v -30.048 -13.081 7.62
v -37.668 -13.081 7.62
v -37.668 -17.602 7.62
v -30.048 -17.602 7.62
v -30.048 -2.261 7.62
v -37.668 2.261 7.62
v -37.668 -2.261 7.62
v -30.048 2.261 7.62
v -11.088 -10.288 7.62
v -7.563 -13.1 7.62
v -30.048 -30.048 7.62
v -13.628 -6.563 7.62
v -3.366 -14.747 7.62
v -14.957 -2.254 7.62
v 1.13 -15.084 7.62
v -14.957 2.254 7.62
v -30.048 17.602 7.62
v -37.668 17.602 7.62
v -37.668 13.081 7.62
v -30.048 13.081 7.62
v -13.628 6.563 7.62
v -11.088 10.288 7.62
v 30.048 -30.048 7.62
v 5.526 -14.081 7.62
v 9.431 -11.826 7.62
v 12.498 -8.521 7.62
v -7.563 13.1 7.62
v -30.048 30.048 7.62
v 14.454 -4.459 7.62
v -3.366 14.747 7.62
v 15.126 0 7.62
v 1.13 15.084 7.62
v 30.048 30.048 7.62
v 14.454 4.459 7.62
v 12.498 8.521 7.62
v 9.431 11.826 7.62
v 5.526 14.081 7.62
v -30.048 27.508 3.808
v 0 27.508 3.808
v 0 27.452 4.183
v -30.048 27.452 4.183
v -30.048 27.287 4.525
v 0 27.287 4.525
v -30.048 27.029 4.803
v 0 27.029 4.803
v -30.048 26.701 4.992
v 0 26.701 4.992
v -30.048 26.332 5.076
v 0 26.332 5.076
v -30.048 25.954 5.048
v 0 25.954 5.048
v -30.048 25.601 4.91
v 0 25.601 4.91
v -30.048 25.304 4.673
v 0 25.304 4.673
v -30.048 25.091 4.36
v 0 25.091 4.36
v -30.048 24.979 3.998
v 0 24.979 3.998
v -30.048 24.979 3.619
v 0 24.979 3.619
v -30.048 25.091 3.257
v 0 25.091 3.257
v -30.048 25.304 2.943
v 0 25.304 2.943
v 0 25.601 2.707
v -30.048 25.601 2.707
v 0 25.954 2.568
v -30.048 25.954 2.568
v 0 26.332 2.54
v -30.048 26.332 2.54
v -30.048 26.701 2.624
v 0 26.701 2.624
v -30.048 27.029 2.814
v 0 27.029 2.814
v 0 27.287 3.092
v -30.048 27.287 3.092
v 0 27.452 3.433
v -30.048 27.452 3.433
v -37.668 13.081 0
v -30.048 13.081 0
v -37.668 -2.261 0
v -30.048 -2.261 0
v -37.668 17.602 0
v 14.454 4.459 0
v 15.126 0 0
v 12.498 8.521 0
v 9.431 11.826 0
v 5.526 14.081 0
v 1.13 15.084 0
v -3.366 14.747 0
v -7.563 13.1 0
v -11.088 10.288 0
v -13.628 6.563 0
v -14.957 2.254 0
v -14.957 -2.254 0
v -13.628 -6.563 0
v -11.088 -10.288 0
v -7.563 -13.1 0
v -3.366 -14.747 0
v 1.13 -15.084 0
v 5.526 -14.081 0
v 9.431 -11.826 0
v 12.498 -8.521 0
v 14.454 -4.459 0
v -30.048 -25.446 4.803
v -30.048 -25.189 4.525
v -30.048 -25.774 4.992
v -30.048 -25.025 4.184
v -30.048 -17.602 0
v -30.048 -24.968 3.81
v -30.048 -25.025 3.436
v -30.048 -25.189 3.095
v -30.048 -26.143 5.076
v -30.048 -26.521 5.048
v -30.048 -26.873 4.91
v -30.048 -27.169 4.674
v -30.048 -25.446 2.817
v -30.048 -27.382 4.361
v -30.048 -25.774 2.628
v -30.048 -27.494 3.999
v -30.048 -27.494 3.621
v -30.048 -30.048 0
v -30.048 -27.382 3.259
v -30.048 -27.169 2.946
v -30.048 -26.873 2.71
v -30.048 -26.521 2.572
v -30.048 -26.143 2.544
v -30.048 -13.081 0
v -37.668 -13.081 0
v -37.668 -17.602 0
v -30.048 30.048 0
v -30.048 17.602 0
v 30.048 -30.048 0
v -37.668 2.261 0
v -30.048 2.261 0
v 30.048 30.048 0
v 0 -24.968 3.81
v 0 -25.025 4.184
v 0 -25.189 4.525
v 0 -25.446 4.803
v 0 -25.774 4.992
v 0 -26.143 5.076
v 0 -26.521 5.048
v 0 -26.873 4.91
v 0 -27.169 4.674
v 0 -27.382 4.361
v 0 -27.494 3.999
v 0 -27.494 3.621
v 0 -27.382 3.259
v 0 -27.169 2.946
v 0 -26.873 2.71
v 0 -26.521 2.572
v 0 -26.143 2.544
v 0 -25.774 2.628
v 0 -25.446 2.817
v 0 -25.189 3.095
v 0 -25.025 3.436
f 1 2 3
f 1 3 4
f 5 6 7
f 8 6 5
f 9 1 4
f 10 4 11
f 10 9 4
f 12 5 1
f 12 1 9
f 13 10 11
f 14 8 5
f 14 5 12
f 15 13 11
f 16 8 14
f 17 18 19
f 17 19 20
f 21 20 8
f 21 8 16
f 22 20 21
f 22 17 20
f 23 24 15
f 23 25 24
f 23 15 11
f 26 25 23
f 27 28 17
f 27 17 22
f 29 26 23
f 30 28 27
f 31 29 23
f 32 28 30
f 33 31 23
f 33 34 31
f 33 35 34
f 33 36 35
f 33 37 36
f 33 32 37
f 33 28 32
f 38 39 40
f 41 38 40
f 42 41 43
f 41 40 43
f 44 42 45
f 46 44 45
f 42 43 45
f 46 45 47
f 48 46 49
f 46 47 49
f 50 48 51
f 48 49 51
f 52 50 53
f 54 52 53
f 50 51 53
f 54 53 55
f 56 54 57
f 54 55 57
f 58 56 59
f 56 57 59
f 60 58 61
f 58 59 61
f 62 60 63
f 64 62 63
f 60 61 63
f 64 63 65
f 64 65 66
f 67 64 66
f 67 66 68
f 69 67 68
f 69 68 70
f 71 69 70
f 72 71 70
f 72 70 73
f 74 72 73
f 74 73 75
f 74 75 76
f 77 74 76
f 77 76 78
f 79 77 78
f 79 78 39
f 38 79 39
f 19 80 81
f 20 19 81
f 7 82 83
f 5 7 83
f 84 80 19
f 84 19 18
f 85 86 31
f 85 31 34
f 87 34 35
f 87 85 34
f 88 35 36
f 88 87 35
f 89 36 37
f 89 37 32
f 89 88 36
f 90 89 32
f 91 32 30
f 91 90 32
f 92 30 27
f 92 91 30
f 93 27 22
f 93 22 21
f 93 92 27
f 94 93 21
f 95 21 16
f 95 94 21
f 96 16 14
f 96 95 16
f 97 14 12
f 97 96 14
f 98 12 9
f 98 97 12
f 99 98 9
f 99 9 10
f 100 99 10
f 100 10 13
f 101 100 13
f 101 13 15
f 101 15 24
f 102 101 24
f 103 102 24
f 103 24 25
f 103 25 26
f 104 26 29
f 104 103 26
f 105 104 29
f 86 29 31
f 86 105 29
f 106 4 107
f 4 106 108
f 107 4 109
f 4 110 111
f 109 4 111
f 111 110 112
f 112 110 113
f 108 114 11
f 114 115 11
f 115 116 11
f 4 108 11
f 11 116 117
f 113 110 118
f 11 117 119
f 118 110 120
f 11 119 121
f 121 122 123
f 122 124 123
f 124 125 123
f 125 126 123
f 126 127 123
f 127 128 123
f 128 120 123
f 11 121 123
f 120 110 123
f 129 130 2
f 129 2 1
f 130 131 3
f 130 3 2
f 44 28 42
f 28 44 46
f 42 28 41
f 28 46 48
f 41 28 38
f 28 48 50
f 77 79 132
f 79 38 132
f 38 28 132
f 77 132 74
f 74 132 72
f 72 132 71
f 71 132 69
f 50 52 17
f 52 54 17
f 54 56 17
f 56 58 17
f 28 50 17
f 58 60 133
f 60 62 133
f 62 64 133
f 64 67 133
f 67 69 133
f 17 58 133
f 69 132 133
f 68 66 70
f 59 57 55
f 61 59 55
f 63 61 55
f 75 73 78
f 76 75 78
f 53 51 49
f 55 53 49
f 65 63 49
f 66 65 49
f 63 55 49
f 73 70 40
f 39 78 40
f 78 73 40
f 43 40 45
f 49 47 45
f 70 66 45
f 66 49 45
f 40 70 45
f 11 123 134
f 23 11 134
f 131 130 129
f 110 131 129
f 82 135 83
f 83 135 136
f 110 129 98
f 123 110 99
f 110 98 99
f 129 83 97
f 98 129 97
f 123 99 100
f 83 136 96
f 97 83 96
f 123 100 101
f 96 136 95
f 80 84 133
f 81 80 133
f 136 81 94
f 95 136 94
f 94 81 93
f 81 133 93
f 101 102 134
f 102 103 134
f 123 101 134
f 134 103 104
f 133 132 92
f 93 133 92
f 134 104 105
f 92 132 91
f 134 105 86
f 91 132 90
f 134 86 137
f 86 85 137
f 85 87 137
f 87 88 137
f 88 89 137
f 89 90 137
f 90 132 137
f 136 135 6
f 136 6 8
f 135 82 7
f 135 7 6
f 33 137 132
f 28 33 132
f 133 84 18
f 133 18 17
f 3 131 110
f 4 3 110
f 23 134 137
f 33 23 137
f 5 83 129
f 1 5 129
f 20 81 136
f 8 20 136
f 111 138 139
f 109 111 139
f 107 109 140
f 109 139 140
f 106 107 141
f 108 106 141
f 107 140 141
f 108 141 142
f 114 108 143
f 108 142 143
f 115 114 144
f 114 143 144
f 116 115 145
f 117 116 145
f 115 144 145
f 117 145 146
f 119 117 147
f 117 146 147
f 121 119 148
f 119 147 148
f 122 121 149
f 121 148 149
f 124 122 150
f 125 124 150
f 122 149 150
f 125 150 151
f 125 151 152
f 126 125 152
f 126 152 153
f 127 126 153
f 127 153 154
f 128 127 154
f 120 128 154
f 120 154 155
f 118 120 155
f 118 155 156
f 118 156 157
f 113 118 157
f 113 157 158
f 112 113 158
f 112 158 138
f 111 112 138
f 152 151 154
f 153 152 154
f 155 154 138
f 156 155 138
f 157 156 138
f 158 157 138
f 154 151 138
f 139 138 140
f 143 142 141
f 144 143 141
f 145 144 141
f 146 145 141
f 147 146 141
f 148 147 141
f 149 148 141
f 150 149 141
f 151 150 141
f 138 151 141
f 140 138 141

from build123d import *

# Parameters (mm, degrees)
F0_R     = 15.126169
F0_W     = 7.62
F0_H     = 4.5212
F1_DEPTH = 7.62
F2_R     = 1.271709
F3_DEPTH = 32.9692
F4_R     = 1.27
F5_DEPTH = 32.766


with BuildPart() as f1:
    # F0 (on Top) → F1 (new body)
    with BuildSketch(Plane.XY):
        Polygon((30.0482, 30.0482), (-30.0482, 30.0482), (-30.0482, 17.6022), (-30.0482, 13.081), (-30.0482, 2.2606), (-30.0482, -2.2606), (-30.0482, -13.081), (-30.0482, -17.6022), (-30.0482, -30.0482), (30.0482, -30.0482), align=None)
        Circle(F0_R, mode=Mode.SUBTRACT)
        with Locations((-33.8582, 15.3416)):
            Rectangle(F0_W, F0_H)
        with Locations((-33.8582, 0)):
            Rectangle(F0_W, F0_H)
        with Locations((-33.8582, -15.3416)):
            Rectangle(F0_W, F0_H)
    extrude(amount=F1_DEPTH)

    # F2 (on Right) → F3 (cut)
    with BuildSketch(Plane.YZ):
        with Locations((26.236491, 3.808291)):
            Circle(F2_R)
    extrude(amount=-F3_DEPTH, mode=Mode.SUBTRACT)

    # F4 (on Right) → F5 (cut)
    with BuildSketch(Plane.YZ):
        with Locations((-26.2382, 3.81)):
            Circle(F4_R)
    extrude(amount=-F5_DEPTH, mode=Mode.SUBTRACT)


solid = f1.part
